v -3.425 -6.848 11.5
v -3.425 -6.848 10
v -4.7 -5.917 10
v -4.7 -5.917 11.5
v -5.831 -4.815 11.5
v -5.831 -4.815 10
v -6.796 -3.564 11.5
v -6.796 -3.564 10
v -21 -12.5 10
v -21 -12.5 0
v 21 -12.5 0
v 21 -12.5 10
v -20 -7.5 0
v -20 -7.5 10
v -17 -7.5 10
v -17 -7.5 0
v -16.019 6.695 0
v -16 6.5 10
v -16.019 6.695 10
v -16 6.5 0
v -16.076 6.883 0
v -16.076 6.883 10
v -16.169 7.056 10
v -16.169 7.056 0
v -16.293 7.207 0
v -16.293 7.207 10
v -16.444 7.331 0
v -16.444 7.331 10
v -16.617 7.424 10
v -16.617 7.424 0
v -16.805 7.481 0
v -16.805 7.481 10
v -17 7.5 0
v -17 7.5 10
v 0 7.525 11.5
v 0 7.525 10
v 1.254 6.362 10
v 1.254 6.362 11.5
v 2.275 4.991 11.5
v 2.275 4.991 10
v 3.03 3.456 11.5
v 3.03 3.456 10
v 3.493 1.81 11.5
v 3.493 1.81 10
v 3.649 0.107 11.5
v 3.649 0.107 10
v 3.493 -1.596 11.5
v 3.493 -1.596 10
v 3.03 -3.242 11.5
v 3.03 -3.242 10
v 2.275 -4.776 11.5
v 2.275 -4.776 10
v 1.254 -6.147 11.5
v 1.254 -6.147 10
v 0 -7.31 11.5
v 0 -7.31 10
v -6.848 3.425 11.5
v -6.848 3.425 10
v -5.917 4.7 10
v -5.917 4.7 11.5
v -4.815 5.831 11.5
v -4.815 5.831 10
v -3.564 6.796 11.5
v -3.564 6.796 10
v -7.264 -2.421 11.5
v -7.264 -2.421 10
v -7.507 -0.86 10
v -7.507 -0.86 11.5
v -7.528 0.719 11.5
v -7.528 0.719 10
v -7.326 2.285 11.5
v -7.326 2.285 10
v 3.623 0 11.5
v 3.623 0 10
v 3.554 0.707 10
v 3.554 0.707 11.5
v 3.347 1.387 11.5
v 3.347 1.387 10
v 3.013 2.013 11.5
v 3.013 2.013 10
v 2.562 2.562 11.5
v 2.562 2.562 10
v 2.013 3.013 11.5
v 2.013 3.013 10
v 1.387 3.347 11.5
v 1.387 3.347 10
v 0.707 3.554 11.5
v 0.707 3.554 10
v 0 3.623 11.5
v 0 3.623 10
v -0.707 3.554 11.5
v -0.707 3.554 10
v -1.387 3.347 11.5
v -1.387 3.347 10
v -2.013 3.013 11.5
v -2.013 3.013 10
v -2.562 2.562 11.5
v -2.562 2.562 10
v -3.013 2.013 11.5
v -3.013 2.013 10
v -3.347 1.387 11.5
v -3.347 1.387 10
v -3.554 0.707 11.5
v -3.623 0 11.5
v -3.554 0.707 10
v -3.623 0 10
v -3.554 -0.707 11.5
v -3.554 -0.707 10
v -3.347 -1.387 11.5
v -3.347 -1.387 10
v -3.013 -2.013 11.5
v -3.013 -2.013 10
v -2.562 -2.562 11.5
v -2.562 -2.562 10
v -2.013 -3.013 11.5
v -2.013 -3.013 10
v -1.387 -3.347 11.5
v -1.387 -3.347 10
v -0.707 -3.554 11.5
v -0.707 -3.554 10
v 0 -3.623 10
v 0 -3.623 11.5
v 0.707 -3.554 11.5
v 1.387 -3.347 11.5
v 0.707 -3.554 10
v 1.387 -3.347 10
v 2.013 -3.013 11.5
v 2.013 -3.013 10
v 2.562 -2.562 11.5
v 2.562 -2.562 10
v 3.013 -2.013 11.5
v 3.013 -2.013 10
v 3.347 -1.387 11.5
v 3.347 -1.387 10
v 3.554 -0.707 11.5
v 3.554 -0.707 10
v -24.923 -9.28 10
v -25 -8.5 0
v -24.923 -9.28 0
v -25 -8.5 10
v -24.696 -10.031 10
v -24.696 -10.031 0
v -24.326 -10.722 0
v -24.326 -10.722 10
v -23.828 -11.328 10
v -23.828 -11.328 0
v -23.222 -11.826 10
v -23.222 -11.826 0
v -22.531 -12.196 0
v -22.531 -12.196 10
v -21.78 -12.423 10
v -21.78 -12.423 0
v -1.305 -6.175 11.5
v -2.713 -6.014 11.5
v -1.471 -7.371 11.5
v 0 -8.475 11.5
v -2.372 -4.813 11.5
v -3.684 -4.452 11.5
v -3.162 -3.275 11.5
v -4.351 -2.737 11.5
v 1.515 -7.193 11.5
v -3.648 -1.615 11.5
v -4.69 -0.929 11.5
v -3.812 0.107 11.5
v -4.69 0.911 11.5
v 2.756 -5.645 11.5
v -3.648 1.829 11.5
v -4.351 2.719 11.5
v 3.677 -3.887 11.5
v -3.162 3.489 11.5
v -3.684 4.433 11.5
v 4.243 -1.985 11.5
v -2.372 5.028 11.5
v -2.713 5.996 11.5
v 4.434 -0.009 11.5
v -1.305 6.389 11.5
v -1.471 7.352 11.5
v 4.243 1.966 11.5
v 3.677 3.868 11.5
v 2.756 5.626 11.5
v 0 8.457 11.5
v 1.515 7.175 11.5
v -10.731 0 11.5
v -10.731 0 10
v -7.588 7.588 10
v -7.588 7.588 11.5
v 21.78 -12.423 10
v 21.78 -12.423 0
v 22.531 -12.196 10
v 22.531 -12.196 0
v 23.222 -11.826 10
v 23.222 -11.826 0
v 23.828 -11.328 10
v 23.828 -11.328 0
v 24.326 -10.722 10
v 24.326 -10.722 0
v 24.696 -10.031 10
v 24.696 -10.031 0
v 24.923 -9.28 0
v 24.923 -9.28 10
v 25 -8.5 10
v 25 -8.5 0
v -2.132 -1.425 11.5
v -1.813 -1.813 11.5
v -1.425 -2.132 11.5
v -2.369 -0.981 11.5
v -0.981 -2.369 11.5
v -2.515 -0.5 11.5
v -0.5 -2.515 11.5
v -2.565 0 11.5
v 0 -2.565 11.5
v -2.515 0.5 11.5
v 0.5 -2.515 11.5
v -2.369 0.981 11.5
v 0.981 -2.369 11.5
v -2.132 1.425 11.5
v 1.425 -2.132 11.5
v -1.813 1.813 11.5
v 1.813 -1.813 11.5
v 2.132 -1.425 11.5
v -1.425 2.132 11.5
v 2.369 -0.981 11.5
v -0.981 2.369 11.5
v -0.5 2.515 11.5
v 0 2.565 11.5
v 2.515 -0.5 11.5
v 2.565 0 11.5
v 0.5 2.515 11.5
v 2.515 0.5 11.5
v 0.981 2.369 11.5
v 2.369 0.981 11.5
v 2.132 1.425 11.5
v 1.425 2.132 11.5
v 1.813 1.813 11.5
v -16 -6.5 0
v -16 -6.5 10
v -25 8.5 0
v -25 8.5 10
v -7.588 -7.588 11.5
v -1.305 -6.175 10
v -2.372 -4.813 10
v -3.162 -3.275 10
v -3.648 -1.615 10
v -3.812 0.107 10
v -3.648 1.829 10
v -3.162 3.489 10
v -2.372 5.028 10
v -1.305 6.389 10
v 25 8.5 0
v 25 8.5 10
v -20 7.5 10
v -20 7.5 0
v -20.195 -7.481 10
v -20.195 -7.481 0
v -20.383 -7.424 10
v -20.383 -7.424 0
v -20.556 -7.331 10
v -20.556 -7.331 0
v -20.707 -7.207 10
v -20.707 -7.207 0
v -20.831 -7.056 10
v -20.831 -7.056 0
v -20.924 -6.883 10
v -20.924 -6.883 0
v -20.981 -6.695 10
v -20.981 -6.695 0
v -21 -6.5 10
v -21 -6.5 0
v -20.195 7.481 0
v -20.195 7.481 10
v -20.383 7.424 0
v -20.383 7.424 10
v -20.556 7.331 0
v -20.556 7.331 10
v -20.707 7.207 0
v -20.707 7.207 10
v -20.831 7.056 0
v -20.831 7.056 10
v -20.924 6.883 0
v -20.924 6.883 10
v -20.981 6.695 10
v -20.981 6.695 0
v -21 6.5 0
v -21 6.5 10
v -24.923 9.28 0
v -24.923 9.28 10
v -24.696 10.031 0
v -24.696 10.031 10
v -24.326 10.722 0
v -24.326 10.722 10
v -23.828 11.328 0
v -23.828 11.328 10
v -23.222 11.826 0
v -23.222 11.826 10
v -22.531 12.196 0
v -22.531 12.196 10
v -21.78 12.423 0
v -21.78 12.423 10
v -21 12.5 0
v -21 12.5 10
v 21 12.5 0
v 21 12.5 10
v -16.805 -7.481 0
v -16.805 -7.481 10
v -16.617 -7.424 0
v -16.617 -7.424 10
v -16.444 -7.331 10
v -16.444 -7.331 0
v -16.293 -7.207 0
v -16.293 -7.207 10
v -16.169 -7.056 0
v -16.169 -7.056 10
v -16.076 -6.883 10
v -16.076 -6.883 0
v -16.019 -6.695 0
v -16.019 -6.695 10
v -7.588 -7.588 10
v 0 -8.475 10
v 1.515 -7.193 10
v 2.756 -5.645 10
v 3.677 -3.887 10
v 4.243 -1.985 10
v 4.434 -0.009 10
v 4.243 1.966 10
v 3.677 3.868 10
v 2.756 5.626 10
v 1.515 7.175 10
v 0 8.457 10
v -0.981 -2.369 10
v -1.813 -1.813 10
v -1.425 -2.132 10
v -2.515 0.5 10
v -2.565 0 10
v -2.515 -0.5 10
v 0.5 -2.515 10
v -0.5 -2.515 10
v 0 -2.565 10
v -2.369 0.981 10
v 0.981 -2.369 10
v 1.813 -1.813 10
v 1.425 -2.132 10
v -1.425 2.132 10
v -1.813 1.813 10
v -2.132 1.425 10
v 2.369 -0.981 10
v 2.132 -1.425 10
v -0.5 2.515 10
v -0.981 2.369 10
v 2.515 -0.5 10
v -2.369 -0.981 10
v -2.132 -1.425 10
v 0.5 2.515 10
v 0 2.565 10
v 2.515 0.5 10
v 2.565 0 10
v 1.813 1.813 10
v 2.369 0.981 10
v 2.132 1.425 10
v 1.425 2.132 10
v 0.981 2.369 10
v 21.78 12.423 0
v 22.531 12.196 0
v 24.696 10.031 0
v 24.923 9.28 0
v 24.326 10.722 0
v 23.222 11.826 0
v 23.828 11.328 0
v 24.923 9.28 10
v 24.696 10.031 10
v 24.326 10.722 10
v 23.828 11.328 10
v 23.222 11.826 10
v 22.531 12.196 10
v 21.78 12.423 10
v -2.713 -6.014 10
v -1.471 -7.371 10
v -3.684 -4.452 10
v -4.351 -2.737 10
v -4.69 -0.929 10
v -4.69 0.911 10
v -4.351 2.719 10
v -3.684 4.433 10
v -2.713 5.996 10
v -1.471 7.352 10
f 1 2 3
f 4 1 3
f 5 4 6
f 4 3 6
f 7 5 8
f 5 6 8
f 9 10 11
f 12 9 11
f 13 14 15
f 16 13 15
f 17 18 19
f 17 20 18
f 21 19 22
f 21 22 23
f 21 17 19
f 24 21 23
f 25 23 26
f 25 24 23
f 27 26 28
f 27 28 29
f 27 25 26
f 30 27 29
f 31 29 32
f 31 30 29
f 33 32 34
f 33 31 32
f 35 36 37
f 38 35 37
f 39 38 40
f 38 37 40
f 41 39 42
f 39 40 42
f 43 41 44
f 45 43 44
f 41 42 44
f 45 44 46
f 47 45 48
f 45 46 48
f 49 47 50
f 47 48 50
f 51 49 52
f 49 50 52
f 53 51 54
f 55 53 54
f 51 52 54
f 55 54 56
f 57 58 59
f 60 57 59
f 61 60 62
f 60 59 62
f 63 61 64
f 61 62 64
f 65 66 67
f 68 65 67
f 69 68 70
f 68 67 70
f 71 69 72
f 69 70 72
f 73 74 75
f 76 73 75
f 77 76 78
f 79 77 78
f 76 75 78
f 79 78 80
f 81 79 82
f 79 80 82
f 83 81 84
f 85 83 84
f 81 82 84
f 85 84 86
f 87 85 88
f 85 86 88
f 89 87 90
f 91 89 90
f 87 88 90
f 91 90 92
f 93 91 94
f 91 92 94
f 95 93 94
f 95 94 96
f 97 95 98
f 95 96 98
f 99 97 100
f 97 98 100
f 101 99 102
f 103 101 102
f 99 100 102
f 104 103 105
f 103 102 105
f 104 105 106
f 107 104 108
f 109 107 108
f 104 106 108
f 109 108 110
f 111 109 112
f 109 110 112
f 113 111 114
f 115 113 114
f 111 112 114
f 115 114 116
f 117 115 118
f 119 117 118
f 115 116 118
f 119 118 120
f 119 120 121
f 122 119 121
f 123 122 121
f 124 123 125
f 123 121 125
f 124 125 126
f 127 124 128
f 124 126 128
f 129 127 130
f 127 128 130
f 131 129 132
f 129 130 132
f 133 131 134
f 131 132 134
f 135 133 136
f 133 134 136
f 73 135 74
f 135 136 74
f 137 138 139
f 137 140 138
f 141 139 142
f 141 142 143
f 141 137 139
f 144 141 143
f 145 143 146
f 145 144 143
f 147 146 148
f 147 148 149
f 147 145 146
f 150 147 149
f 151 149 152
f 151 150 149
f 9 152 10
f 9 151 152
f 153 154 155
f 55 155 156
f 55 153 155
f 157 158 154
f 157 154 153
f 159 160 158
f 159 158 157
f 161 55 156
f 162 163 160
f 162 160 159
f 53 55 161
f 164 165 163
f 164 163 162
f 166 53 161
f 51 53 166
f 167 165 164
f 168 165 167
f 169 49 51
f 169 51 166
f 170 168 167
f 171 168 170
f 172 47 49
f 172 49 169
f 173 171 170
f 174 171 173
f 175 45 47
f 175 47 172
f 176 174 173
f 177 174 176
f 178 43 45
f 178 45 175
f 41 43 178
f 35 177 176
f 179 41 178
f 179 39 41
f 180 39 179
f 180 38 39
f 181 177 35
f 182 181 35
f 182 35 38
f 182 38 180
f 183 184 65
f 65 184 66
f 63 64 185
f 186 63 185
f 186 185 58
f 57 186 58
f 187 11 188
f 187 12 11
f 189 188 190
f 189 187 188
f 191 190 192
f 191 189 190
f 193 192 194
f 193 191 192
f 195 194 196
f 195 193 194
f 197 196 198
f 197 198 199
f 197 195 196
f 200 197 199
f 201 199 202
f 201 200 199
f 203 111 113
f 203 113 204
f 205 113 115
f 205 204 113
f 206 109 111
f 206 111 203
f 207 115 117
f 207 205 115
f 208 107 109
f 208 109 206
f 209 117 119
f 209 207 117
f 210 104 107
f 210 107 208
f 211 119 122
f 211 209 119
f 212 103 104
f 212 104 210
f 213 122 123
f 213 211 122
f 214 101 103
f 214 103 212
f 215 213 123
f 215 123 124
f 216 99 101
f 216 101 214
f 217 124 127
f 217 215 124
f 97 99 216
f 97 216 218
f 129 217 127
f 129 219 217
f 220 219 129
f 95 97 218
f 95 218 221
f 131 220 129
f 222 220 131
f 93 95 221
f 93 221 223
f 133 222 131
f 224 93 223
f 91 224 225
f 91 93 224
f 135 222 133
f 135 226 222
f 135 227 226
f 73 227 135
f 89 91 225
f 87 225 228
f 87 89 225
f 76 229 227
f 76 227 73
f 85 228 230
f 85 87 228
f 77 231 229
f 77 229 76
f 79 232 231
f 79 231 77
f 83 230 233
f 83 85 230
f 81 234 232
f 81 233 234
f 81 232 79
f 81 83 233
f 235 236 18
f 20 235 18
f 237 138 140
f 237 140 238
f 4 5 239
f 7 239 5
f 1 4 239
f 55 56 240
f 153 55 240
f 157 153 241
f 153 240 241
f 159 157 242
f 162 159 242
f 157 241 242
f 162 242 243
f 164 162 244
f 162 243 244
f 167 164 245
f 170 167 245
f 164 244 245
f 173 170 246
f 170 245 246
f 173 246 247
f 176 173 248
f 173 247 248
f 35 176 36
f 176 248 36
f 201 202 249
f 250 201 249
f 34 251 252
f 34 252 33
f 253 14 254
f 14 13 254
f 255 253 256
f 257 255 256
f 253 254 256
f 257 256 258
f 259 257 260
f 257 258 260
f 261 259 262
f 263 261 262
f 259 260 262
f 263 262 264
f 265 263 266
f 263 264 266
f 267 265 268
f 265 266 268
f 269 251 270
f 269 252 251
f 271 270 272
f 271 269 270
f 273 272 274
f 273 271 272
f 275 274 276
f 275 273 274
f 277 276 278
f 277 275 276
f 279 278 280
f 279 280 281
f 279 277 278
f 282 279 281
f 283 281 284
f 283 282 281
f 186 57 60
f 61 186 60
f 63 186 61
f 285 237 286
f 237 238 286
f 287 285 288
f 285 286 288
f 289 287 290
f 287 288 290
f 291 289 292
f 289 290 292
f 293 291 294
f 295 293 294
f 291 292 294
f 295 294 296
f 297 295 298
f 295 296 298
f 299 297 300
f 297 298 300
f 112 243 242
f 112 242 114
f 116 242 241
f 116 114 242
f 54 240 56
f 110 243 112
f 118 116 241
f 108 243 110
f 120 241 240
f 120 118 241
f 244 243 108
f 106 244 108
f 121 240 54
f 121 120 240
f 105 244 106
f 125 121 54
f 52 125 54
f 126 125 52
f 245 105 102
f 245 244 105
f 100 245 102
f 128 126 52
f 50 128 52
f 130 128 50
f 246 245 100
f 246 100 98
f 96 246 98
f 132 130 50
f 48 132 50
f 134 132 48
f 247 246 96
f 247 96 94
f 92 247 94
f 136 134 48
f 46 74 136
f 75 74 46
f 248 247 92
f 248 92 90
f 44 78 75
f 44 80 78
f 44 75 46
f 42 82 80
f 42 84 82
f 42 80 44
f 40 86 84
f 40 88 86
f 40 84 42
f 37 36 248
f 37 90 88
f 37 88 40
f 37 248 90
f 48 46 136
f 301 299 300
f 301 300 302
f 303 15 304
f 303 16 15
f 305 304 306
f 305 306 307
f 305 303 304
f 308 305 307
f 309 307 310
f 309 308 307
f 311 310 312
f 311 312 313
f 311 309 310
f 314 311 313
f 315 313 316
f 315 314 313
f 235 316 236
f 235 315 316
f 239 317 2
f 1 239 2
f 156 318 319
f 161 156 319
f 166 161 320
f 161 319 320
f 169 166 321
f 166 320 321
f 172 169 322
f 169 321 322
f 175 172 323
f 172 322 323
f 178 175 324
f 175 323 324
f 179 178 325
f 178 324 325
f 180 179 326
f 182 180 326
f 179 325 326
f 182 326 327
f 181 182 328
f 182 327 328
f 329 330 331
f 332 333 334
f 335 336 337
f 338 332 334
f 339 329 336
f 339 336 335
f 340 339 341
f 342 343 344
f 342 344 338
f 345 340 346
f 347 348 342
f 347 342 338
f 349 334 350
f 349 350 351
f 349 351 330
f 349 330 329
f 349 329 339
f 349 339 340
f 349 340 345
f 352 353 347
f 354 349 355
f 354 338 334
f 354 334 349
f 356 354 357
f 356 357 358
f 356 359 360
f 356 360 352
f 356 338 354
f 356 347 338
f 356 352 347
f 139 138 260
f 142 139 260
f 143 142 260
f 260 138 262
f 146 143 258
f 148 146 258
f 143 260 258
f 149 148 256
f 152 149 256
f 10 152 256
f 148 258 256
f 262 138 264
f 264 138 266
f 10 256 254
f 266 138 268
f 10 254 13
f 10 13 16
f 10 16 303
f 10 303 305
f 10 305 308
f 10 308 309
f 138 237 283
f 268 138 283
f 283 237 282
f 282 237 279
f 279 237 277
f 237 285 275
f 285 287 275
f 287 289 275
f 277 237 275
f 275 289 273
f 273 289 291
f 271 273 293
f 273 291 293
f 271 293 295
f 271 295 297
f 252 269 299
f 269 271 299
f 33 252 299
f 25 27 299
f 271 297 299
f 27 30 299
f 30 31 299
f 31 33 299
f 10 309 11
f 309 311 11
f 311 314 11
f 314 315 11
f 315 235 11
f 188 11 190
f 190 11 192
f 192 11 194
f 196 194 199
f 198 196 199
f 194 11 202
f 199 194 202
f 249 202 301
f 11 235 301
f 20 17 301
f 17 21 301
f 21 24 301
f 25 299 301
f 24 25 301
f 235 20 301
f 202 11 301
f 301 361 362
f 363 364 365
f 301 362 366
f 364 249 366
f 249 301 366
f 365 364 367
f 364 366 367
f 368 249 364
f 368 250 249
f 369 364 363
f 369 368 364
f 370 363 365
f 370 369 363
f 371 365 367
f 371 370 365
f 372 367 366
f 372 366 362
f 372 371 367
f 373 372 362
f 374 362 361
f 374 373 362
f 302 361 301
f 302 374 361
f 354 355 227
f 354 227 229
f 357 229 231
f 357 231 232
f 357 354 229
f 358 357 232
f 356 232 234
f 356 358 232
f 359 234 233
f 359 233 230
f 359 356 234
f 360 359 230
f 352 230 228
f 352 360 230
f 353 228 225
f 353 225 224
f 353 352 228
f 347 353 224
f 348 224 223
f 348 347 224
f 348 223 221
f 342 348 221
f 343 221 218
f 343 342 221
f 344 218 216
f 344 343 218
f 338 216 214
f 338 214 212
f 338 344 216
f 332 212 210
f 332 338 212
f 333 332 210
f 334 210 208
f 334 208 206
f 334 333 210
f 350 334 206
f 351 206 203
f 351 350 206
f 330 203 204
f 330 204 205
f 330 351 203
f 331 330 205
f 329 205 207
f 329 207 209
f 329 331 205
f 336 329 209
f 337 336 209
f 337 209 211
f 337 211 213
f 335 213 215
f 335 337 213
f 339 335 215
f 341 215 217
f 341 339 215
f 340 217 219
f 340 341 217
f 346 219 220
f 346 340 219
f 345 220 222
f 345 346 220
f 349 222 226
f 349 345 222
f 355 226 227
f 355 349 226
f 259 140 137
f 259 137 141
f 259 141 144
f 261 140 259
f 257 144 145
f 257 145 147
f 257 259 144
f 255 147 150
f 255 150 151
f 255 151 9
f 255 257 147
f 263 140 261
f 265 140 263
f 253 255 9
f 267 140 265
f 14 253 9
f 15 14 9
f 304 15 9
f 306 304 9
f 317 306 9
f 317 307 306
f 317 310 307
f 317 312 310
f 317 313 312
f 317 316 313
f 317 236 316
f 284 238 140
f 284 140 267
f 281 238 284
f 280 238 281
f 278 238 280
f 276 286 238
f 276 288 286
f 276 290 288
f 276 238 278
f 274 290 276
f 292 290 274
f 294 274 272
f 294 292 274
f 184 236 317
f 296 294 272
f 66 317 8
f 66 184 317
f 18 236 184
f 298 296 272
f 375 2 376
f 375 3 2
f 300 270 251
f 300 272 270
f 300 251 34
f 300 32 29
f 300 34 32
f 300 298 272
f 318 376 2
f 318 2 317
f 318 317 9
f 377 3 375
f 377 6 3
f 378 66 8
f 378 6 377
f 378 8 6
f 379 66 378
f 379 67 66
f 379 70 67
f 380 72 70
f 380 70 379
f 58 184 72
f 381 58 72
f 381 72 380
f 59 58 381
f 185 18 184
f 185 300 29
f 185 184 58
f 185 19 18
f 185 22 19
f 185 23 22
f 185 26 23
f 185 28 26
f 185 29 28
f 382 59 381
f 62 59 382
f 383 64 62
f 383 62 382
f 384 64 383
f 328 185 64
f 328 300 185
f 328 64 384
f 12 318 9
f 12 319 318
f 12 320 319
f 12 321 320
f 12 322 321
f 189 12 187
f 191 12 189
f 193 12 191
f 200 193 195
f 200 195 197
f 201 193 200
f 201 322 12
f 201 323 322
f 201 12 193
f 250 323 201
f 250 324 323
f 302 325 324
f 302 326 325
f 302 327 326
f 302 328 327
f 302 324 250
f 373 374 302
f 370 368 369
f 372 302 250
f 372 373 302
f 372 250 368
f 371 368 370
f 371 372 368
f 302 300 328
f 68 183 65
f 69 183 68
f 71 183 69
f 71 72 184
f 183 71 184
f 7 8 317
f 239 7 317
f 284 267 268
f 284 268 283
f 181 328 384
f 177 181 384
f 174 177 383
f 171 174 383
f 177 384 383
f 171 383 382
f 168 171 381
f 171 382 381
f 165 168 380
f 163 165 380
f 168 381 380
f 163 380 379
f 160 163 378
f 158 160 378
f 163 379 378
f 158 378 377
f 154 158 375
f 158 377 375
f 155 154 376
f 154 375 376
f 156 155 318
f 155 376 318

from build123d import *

# Parameters (mm, degrees)
F0_W     = 50
F0_H     = 25
F1_DEPTH = 10
F2_R     = 4
F3_W     = 5
F3_H     = 15
F4_DEPTH = 25
F5_R     = 1
F6_R     = 3.6231488333
F6_R_2   = 2.5645914907
F7_DEPTH = 1.5


with BuildPart() as f1:
    # F0 (on Top) → F1 (new body)
    with BuildSketch(Plane.XY):
        Rectangle(F0_W, F0_H)
    extrude(amount=F1_DEPTH)

    # F2
    f2_edges = [f1.edges().sort_by_distance(p)[0] for p in [
        (-25, -12.5, 5),
        (25, -12.5, 5),
        (25, 12.5, 5),
        (-25, 12.5, 5),
    ]]
    fillet(f2_edges, radius=F2_R)

    # F3 (on face) → F4 (cut)
    with BuildSketch(Plane.XY.offset(10)):
        with Locations((-18.5, 0)):
            Rectangle(F3_W, F3_H)
    extrude(amount=-F4_DEPTH, mode=Mode.SUBTRACT)

    # F5
    f5_edges = [f1.edges().sort_by_distance(p)[0] for p in [
        (-21, 7.5, 5),
        (-21, -7.5, 5),
        (-16, 7.5, 5),
        (-16, -7.5, 5),
    ]]
    fillet(f5_edges, radius=F5_R)

    # F6 (on face) → F7 (join)
    with BuildSketch(Plane.XY.offset(10)):
        with BuildLine():
            ThreePointArc((0, -8.4754349664), (4.4343331639, -0.0092051923), (0, 8.4570245817))
            ThreePointArc((0, 8.4570245817), (-4.7324505421, -0.0092051923), (0, -8.4754349664))
        make_face()
        with BuildLine():
            ThreePointArc((0, -7.3103578761), (-3.8122546037, 0.107302476), (0, 7.524962828))
            ThreePointArc((0, 7.524962828), (3.6492929607, 0.107302476), (0, -7.3103578761))
        make_face(mode=Mode.SUBTRACT)
        Circle(F6_R)
        Circle(F6_R_2, mode=Mode.SUBTRACT)
        with BuildLine():
            Line((-7.5879783359, -7.5879783359), (-3.4245205097, -6.8479519513))
            ThreePointArc((-3.4245205097, -6.8479519513), (-5.2850781661, -5.385812279), (-6.795665493, -3.5643696799))
            Line((-6.795665493, -3.5643696799), (-7.5879783359, -7.5879783359))
        make_face()
        with BuildLine():
            ThreePointArc((-7.2637349367, -2.4207315873), (-7.545458995, -0.0712297744), (-7.3256511241, 2.2848711815))
            Line((-7.3256511241, 2.2848711815), (-10.7310218737, 0))
            Line((-10.7310218737, 0), (-7.2637349367, -2.4207315873))
        make_face()
        with BuildLine():
            Line((-3.5643696799, 6.795665493), (-7.5879783359, 7.5879783359))
            Line((-7.5879783359, 7.5879783359), (-6.8479519513, 3.4245205097))
            ThreePointArc((-6.8479519513, 3.4245205097), (-5.385812279, 5.2850781661), (-3.5643696799, 6.795665493))
        make_face()
    extrude(amount=F7_DEPTH)


solid = f1.part
